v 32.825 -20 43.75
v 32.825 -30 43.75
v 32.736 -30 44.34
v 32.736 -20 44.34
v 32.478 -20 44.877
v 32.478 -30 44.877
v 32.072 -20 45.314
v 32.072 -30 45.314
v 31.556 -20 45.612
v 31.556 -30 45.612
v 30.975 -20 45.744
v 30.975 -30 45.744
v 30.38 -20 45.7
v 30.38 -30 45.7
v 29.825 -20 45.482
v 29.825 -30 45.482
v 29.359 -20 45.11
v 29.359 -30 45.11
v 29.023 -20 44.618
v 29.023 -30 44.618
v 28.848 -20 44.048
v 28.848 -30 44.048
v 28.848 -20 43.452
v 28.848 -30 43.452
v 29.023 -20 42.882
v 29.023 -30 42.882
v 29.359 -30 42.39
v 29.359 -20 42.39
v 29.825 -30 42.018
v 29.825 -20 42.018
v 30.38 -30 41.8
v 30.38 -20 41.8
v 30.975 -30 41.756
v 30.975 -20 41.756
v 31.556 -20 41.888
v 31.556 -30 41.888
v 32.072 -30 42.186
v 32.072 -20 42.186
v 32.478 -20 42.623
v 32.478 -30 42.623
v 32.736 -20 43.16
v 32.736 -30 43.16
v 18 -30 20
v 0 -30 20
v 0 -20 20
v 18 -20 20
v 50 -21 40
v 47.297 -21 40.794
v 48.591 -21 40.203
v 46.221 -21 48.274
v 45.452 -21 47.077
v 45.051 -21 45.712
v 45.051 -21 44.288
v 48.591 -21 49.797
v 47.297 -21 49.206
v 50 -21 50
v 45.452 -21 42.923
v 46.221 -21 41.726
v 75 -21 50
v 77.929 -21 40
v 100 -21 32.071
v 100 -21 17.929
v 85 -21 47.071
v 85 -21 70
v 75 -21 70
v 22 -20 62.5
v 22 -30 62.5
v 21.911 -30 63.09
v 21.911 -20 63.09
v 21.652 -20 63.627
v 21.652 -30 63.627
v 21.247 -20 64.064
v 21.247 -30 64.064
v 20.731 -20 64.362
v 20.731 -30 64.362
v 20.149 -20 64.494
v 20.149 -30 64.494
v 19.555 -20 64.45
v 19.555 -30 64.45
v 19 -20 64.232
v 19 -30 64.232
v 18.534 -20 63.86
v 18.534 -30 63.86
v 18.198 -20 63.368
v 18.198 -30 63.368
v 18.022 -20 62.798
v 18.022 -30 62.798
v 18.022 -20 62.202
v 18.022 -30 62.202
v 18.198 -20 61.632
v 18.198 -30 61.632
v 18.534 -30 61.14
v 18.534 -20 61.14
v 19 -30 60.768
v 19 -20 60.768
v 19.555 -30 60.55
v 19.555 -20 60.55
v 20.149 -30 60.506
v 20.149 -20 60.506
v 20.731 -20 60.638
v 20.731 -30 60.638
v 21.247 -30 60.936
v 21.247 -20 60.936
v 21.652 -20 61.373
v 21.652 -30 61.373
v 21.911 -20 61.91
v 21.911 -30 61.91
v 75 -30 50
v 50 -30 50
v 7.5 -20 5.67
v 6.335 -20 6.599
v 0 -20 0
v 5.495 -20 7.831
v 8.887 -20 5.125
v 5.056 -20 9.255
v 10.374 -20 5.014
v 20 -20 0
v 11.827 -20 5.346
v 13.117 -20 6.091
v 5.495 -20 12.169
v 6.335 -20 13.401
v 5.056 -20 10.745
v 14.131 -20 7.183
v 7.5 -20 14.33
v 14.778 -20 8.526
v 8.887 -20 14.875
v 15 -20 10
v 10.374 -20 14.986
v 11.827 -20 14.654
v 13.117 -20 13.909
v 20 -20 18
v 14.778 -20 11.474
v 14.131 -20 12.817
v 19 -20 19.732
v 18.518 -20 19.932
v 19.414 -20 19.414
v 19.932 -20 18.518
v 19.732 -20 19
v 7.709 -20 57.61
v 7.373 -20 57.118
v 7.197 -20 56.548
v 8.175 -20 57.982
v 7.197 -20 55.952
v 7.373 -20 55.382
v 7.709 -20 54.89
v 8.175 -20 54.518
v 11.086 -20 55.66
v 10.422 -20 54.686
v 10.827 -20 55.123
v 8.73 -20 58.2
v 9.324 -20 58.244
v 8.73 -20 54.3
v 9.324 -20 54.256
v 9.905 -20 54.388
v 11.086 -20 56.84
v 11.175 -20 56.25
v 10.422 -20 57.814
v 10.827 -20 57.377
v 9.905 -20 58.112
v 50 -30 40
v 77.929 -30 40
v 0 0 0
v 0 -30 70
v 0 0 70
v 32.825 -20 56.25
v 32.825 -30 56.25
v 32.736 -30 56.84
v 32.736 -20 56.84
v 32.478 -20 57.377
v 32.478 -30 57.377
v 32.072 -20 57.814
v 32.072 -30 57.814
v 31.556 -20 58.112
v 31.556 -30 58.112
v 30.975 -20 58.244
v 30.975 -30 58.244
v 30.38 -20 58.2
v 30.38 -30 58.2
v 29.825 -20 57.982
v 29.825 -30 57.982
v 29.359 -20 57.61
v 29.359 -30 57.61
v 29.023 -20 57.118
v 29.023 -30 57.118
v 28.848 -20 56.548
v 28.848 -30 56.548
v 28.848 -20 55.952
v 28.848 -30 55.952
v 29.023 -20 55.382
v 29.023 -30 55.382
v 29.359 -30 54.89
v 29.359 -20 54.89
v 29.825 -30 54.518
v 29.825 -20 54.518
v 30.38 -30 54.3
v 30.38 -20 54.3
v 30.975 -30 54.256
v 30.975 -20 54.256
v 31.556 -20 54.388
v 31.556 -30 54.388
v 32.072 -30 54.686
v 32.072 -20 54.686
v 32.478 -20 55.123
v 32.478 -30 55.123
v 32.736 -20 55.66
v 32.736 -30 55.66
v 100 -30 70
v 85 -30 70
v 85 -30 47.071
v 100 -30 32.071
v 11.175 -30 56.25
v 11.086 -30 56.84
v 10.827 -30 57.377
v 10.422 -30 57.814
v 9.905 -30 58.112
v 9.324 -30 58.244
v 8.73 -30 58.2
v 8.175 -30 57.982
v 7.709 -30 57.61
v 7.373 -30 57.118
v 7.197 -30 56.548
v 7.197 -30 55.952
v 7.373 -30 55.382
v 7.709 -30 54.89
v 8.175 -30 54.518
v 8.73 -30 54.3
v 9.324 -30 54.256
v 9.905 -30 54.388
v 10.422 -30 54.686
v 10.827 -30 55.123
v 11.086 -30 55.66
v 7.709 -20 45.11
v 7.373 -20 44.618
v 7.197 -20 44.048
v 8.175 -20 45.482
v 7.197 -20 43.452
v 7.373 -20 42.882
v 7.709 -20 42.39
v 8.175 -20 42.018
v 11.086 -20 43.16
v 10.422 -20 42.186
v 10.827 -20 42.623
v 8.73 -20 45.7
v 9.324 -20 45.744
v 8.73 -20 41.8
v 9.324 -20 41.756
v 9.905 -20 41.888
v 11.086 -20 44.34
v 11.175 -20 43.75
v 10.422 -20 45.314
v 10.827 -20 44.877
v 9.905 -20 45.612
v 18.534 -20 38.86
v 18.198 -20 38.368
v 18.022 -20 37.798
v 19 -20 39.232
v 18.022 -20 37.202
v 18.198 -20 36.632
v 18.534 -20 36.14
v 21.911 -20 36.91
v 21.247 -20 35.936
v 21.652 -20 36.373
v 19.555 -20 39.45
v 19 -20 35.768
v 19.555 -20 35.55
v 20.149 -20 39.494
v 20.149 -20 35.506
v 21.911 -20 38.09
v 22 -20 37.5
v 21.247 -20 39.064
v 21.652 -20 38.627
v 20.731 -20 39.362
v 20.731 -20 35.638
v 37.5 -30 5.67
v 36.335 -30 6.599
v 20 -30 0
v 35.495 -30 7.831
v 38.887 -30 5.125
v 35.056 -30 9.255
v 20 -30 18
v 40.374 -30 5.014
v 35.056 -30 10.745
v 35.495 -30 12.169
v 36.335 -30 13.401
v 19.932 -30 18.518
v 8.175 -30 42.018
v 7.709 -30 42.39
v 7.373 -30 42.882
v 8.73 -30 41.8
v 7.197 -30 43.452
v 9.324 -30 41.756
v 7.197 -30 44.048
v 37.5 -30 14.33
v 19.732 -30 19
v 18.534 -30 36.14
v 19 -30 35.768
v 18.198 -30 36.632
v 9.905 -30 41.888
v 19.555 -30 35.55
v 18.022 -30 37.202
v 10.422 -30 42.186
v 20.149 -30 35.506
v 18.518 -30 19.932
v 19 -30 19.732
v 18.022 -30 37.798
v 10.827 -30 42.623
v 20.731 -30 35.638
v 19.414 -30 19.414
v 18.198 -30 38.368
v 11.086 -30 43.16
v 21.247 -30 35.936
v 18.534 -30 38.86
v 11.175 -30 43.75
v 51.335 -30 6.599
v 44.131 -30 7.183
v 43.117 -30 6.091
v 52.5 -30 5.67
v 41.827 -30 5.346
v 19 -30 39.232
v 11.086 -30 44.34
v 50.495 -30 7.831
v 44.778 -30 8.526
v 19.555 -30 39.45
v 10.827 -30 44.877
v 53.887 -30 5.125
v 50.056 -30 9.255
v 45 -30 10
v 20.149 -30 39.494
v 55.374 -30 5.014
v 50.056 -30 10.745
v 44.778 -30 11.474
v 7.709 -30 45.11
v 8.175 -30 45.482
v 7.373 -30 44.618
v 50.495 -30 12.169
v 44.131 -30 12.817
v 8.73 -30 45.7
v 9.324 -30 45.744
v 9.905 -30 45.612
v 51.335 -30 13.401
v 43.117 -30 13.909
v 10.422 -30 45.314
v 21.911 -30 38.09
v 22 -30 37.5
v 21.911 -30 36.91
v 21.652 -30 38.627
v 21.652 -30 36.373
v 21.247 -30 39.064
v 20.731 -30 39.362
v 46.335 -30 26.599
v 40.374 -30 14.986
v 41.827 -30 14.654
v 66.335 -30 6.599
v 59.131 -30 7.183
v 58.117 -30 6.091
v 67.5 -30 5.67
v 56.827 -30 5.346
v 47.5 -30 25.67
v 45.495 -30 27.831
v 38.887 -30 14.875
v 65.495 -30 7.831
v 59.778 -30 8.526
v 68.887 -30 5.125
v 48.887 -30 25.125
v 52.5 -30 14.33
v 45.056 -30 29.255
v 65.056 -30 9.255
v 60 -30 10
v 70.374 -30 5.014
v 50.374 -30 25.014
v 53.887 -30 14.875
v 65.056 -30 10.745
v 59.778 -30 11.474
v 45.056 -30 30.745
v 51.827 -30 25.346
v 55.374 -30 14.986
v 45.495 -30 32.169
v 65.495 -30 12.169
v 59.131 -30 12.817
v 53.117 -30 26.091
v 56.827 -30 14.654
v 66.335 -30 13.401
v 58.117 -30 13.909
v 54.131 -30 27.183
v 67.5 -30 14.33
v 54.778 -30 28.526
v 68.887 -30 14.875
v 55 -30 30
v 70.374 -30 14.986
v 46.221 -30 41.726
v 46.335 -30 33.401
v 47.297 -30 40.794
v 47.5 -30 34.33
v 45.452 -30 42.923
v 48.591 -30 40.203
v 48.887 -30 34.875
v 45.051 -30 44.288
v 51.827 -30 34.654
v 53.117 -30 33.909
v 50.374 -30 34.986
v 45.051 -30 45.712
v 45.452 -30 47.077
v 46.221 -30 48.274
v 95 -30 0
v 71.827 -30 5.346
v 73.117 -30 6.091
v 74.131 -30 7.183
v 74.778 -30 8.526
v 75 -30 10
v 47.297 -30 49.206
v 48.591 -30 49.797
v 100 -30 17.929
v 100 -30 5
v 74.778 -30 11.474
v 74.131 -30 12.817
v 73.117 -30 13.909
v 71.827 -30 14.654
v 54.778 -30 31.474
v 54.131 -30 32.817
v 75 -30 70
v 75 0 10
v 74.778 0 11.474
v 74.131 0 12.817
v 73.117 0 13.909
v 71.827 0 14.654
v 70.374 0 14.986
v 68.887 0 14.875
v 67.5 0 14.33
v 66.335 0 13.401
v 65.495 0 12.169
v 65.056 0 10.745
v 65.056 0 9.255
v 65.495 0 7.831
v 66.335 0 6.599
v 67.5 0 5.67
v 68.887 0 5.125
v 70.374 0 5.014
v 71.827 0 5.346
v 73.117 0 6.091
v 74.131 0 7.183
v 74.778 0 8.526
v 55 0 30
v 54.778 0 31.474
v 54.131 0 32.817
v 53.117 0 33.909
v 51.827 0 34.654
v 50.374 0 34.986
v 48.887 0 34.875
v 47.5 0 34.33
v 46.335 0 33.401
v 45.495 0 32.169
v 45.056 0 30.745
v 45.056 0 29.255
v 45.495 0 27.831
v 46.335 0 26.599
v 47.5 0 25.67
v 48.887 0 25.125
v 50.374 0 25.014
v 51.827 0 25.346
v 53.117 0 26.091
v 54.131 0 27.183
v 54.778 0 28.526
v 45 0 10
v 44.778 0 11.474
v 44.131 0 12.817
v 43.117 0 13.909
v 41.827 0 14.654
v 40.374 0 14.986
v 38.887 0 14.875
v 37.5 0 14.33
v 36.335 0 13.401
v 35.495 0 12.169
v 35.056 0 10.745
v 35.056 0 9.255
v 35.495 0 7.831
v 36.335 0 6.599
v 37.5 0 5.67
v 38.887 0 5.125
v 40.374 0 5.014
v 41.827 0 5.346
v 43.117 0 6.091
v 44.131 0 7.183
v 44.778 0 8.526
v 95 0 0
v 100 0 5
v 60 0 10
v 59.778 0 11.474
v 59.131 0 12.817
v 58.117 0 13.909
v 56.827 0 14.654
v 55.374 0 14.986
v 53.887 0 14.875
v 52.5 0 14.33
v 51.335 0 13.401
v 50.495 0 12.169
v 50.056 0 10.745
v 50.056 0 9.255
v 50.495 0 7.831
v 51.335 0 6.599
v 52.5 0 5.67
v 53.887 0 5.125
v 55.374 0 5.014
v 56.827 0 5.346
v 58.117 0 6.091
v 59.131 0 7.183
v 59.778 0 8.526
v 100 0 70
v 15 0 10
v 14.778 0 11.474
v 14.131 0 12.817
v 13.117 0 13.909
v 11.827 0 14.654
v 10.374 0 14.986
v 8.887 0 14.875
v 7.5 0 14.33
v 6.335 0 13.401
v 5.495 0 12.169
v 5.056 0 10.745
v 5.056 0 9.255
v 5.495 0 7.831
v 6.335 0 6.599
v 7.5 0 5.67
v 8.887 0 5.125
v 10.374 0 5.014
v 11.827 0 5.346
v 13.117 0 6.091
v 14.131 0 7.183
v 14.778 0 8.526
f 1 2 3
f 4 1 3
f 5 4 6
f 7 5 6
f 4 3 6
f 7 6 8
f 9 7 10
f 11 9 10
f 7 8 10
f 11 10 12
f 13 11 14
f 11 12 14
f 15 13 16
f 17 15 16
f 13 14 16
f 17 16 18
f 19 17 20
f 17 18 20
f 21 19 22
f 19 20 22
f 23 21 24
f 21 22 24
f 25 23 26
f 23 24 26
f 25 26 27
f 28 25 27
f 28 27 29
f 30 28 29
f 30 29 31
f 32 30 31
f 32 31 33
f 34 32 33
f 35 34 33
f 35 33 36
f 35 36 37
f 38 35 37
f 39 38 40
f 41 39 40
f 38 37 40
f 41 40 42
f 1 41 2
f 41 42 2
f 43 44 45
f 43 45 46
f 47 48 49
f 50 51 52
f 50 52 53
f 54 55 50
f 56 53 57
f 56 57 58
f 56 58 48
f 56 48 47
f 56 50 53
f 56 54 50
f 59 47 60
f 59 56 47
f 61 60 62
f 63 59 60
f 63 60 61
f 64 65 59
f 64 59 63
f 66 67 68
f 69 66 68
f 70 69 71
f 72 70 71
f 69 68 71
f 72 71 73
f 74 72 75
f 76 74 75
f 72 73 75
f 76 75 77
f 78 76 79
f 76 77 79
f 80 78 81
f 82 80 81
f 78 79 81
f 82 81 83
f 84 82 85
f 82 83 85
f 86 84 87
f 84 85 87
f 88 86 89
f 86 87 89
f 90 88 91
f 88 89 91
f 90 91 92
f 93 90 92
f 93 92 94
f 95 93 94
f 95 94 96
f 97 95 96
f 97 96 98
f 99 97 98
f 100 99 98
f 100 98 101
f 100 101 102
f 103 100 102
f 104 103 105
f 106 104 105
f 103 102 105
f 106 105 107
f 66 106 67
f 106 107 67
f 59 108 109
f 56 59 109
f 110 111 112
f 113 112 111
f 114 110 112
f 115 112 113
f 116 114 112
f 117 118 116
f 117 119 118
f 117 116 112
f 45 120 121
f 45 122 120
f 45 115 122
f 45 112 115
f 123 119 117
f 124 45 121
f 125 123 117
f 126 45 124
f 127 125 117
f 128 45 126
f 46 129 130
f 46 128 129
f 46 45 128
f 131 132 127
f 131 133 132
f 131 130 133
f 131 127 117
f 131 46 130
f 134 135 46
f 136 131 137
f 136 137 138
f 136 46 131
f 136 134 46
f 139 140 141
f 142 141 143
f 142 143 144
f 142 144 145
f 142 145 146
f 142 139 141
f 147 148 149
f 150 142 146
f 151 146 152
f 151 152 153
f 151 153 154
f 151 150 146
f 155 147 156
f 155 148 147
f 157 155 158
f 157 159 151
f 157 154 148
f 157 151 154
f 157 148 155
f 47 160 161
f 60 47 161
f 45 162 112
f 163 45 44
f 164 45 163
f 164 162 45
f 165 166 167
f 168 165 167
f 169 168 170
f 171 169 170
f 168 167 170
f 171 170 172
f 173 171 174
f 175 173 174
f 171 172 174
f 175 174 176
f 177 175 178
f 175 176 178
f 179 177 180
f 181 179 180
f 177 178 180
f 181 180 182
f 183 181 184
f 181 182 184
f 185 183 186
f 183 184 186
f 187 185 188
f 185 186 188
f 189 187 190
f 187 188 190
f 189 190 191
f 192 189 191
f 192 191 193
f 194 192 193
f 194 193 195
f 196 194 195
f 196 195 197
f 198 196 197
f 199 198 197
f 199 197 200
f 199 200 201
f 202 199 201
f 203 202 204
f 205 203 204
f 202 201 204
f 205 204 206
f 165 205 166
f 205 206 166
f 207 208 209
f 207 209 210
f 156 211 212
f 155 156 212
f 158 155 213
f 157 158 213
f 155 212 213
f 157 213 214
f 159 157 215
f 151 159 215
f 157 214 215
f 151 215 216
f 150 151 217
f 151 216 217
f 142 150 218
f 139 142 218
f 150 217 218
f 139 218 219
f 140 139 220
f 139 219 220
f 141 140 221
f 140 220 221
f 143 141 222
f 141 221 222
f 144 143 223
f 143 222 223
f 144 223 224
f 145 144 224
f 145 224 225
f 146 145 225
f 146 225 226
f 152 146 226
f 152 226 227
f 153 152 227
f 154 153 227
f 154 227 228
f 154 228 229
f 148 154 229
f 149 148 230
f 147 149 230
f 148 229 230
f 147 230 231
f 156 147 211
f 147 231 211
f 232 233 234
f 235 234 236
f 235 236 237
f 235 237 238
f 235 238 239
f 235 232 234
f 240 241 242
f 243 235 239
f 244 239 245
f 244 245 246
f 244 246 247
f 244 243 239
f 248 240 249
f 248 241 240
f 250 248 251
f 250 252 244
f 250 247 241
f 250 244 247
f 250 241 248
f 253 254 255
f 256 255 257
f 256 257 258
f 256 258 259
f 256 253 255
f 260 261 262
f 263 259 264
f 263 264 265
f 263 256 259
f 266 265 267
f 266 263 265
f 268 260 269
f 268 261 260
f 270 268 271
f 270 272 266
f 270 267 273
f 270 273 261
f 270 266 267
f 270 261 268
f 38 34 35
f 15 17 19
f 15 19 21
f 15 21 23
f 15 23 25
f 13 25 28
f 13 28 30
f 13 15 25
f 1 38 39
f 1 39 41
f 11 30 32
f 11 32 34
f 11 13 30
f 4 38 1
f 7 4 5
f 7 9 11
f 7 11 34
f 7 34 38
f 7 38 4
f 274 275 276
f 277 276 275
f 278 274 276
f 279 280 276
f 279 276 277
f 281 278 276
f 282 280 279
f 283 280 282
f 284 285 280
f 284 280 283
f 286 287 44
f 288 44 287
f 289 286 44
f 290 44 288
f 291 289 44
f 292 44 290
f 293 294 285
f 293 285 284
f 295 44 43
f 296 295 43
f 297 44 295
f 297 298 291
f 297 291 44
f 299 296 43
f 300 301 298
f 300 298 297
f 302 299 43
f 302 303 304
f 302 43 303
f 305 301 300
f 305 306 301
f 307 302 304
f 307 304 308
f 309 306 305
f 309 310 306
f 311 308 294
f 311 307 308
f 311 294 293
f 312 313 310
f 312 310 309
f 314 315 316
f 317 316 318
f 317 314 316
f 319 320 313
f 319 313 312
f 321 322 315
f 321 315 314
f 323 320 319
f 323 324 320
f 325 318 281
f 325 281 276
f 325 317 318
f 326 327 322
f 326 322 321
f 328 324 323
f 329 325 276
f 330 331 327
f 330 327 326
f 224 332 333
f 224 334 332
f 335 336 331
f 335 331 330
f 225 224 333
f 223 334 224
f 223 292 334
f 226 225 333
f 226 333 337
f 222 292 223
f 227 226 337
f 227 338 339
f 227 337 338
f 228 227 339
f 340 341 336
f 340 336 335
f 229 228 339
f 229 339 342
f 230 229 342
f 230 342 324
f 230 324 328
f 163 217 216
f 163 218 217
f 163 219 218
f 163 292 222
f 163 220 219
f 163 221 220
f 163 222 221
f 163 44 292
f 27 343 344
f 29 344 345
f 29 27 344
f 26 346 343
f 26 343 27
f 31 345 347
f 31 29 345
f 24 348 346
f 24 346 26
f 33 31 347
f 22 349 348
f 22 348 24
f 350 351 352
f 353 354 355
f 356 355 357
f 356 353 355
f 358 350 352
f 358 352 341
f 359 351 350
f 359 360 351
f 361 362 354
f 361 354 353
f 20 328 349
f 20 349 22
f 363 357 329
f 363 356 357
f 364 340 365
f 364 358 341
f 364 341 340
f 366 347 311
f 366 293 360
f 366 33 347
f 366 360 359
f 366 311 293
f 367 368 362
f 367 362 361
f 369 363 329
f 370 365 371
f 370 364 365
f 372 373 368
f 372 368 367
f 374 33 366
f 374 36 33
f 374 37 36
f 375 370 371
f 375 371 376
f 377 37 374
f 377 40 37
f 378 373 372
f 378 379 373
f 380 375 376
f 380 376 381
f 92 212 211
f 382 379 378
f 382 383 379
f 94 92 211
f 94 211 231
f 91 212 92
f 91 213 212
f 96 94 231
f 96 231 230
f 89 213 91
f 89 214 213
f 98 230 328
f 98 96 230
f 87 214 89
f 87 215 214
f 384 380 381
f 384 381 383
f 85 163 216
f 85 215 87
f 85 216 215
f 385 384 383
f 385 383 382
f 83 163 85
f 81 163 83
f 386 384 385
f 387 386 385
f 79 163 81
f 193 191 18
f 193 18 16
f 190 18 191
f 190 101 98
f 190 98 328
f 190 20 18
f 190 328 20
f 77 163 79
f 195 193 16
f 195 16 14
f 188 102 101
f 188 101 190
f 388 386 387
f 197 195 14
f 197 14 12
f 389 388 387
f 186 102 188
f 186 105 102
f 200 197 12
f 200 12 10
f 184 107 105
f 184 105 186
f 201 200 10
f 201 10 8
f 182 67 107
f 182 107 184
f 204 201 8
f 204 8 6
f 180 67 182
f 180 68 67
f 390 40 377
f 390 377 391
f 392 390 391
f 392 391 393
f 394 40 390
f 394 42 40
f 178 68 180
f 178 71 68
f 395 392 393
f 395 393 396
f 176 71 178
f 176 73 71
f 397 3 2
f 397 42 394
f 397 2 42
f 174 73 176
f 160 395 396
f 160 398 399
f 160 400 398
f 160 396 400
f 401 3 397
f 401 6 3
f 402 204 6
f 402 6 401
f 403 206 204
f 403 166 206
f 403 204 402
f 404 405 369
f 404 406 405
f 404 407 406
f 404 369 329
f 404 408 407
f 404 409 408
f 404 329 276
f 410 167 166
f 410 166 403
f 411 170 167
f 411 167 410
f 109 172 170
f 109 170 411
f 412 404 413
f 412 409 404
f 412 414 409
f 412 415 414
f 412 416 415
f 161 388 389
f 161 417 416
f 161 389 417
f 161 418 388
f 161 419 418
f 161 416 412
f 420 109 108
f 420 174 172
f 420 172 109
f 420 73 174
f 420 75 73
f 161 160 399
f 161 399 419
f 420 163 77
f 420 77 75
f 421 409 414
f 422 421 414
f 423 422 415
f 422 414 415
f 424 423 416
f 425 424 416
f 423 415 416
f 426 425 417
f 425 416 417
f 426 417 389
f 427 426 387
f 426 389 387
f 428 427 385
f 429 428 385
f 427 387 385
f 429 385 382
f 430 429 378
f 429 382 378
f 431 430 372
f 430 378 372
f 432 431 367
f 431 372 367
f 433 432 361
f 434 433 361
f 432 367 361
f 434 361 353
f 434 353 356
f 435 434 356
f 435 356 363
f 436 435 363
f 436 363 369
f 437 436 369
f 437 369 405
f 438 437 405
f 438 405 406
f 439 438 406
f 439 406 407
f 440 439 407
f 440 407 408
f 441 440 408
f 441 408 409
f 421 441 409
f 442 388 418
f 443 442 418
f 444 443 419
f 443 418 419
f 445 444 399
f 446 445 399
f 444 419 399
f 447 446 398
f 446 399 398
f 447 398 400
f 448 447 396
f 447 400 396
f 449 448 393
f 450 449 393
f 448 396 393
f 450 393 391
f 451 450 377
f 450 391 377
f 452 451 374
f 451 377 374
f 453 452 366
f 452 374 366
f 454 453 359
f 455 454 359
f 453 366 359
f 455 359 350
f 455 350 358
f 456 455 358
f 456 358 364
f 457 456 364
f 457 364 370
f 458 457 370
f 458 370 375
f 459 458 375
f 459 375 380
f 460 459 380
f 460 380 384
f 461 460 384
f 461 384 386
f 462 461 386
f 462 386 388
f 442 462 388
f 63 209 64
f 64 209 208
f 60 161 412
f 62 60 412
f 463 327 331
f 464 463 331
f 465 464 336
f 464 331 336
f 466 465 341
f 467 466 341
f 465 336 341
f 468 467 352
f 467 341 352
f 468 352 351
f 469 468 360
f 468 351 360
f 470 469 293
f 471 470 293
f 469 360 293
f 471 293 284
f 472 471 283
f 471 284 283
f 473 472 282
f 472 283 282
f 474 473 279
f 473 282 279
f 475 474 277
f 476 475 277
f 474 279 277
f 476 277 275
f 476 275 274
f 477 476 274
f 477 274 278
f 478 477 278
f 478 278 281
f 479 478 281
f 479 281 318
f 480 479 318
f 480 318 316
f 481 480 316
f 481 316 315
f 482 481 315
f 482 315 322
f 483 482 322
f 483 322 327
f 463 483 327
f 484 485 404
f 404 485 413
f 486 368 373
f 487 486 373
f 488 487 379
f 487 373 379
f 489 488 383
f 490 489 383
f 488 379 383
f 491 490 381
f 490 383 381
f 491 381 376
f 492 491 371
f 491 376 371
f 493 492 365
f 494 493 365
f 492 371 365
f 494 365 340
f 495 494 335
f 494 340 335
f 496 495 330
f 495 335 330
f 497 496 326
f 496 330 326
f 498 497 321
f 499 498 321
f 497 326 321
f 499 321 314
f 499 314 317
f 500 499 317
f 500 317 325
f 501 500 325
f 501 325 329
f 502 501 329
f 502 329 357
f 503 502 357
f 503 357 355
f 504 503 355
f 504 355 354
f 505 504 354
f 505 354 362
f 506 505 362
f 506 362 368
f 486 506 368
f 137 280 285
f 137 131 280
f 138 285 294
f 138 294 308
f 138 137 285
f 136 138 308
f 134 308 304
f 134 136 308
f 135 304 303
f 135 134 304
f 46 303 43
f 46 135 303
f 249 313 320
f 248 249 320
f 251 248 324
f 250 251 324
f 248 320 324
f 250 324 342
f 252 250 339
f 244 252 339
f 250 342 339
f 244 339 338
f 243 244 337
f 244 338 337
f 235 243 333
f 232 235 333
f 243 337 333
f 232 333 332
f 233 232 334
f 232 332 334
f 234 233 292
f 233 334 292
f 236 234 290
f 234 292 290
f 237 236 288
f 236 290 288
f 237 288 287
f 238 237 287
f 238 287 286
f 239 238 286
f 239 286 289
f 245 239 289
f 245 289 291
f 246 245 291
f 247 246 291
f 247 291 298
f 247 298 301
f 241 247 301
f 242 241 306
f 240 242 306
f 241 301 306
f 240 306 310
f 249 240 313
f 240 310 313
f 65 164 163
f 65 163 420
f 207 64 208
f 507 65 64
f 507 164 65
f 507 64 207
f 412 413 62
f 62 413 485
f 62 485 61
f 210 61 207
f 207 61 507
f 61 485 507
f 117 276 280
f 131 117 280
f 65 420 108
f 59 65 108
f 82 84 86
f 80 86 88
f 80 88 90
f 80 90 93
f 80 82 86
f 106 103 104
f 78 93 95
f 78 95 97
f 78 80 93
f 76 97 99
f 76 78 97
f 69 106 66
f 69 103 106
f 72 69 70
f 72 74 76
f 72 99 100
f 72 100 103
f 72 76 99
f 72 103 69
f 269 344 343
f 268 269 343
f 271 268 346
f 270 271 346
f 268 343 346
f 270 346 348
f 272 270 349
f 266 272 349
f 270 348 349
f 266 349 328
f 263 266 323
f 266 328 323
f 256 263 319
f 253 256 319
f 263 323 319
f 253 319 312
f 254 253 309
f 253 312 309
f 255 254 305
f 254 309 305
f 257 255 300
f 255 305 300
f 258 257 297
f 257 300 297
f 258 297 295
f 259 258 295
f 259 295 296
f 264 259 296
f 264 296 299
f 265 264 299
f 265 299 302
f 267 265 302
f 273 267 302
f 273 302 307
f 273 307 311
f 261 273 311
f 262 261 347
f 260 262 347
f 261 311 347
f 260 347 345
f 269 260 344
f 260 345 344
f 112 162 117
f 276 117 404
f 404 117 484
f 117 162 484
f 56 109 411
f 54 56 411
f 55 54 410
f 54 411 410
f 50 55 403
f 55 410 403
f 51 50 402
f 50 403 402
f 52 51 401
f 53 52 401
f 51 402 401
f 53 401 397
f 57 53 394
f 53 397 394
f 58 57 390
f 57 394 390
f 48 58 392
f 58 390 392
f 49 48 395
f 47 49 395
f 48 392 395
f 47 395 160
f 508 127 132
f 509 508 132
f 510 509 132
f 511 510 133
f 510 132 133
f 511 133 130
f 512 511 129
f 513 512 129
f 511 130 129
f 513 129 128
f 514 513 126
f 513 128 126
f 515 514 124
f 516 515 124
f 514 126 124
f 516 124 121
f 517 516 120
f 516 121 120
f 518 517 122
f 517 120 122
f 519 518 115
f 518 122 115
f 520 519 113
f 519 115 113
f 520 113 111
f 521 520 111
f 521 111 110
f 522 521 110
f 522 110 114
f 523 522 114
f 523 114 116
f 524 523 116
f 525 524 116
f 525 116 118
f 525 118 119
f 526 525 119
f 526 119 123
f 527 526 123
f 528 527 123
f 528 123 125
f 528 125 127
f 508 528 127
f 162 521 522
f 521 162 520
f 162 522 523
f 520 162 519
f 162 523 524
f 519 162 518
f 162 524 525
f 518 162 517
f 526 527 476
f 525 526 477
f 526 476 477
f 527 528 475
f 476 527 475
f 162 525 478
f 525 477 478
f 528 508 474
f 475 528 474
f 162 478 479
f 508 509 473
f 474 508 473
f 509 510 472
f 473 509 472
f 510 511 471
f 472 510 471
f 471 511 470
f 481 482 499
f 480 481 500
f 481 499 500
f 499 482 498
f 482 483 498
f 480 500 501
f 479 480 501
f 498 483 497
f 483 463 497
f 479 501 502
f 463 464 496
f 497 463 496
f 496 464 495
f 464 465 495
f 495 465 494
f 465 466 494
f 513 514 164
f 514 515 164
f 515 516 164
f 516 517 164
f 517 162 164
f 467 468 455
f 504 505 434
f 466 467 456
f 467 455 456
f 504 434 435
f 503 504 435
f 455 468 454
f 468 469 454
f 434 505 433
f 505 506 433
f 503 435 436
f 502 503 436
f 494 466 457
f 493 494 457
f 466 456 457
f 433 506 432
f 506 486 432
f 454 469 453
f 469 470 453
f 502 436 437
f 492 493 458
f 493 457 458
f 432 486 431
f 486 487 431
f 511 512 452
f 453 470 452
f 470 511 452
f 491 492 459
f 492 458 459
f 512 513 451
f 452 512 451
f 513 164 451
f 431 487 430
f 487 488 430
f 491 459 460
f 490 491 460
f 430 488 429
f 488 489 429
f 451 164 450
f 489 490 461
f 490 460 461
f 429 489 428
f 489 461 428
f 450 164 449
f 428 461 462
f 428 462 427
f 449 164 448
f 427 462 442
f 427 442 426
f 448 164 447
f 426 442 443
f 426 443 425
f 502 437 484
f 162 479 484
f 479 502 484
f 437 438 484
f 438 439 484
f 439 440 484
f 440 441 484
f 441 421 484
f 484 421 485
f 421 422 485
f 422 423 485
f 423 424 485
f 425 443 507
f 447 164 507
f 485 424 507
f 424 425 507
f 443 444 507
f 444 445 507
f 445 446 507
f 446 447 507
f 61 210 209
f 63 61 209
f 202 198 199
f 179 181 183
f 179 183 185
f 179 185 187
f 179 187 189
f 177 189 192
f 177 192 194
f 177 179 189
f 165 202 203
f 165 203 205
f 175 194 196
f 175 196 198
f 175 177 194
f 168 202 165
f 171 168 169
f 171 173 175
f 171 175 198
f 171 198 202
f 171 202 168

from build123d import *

# Parameters (mm, degrees)
F0_W      = 100
F0_H      = 70
F1_DEPTH  = 30
F3_DEPTH  = 9
F4_W      = 20
F4_H      = 20
F5_DEPTH  = 10
F6_R      = 5
F7_DEPTH  = 25
F8_R      = 2
F9_DEPTH  = 10
F10_R     = 5
F11_DEPTH = 41.45141
F12_SIZE  = 5
F13_R     = 2


with BuildPart() as f1:
    # F0 (on Front) → F1 (new body)
    with BuildSketch(Plane.XZ):
        with Locations((50, 35)):
            Rectangle(F0_W, F0_H)
    extrude(amount=F1_DEPTH)

    # F2 (on face) → F3 (cut)
    with BuildSketch(Plane.XZ.offset(30)):
        with BuildLine():
            Line((85.000001, 70), (75, 70))
            Line((75, 70), (75, 50))
            Line((75, 50), (50, 50))
            ThreePointArc((50, 50), (45, 45), (50, 39.999999))
            Line((50, 39.999999), (77.928933, 39.999999))
            Line((77.928933, 39.999999), (100, 17.928932))
            Line((100, 17.928932), (100, 32.07107))
            Line((100, 32.07107), (85.000001, 47.071069))
            Line((85.000001, 47.071069), (85.000001, 70))
        make_face()
    extrude(amount=-F3_DEPTH, mode=Mode.SUBTRACT)

    # F4 (on face) → F5 (cut)
    with BuildSketch(Plane.XZ.offset(30)):
        with Locations((10, 10)):
            Rectangle(F4_W, F4_H)
    extrude(amount=-F5_DEPTH, mode=Mode.SUBTRACT)

    # F6 (on face) → F7 (cut)
    with BuildSketch(Plane.XZ.offset(20)):
        with Locations((10, 10)):
            Circle(F6_R)
    extrude(amount=-F7_DEPTH, mode=Mode.SUBTRACT)

    # F8 (on face) → F9 (cut)
    with BuildSketch(Plane.XZ.offset(30)):
        with Locations((20, 62.5)):
            Circle(F8_R)
        with Locations((9.174682, 56.25)):
            Circle(F8_R)
        with Locations((9.174682, 43.75)):
            Circle(F8_R)
        with Locations((20, 37.5)):
            Circle(F8_R)
        with Locations((30.825318, 43.75)):
            Circle(F8_R)
        with Locations((30.825318, 56.25)):
            Circle(F8_R)
    extrude(amount=-F9_DEPTH, mode=Mode.SUBTRACT)

    # F10 (on face) → F11 (cut)
    with BuildSketch(Plane.XZ.offset(30)):
        with Locations((40, 10)):
            Circle(F10_R)
        with Locations((55, 10)):
            Circle(F10_R)
        with Locations((70, 10)):
            Circle(F10_R)
        with Locations((50, 30)):
            Circle(F10_R)
    extrude(amount=-F11_DEPTH, mode=Mode.SUBTRACT)

    # F12
    f12_edges = [f1.edges().sort_by_distance(p)[0] for p in [
        (100, -15, 0),
    ]]
    chamfer(f12_edges, length=F12_SIZE)

    # F13
    f13_edges = [f1.edges().sort_by_distance(p)[0] for p in [
        (20, -25, 20),
    ]]
    fillet(f13_edges, radius=F13_R)


solid = f1.part
